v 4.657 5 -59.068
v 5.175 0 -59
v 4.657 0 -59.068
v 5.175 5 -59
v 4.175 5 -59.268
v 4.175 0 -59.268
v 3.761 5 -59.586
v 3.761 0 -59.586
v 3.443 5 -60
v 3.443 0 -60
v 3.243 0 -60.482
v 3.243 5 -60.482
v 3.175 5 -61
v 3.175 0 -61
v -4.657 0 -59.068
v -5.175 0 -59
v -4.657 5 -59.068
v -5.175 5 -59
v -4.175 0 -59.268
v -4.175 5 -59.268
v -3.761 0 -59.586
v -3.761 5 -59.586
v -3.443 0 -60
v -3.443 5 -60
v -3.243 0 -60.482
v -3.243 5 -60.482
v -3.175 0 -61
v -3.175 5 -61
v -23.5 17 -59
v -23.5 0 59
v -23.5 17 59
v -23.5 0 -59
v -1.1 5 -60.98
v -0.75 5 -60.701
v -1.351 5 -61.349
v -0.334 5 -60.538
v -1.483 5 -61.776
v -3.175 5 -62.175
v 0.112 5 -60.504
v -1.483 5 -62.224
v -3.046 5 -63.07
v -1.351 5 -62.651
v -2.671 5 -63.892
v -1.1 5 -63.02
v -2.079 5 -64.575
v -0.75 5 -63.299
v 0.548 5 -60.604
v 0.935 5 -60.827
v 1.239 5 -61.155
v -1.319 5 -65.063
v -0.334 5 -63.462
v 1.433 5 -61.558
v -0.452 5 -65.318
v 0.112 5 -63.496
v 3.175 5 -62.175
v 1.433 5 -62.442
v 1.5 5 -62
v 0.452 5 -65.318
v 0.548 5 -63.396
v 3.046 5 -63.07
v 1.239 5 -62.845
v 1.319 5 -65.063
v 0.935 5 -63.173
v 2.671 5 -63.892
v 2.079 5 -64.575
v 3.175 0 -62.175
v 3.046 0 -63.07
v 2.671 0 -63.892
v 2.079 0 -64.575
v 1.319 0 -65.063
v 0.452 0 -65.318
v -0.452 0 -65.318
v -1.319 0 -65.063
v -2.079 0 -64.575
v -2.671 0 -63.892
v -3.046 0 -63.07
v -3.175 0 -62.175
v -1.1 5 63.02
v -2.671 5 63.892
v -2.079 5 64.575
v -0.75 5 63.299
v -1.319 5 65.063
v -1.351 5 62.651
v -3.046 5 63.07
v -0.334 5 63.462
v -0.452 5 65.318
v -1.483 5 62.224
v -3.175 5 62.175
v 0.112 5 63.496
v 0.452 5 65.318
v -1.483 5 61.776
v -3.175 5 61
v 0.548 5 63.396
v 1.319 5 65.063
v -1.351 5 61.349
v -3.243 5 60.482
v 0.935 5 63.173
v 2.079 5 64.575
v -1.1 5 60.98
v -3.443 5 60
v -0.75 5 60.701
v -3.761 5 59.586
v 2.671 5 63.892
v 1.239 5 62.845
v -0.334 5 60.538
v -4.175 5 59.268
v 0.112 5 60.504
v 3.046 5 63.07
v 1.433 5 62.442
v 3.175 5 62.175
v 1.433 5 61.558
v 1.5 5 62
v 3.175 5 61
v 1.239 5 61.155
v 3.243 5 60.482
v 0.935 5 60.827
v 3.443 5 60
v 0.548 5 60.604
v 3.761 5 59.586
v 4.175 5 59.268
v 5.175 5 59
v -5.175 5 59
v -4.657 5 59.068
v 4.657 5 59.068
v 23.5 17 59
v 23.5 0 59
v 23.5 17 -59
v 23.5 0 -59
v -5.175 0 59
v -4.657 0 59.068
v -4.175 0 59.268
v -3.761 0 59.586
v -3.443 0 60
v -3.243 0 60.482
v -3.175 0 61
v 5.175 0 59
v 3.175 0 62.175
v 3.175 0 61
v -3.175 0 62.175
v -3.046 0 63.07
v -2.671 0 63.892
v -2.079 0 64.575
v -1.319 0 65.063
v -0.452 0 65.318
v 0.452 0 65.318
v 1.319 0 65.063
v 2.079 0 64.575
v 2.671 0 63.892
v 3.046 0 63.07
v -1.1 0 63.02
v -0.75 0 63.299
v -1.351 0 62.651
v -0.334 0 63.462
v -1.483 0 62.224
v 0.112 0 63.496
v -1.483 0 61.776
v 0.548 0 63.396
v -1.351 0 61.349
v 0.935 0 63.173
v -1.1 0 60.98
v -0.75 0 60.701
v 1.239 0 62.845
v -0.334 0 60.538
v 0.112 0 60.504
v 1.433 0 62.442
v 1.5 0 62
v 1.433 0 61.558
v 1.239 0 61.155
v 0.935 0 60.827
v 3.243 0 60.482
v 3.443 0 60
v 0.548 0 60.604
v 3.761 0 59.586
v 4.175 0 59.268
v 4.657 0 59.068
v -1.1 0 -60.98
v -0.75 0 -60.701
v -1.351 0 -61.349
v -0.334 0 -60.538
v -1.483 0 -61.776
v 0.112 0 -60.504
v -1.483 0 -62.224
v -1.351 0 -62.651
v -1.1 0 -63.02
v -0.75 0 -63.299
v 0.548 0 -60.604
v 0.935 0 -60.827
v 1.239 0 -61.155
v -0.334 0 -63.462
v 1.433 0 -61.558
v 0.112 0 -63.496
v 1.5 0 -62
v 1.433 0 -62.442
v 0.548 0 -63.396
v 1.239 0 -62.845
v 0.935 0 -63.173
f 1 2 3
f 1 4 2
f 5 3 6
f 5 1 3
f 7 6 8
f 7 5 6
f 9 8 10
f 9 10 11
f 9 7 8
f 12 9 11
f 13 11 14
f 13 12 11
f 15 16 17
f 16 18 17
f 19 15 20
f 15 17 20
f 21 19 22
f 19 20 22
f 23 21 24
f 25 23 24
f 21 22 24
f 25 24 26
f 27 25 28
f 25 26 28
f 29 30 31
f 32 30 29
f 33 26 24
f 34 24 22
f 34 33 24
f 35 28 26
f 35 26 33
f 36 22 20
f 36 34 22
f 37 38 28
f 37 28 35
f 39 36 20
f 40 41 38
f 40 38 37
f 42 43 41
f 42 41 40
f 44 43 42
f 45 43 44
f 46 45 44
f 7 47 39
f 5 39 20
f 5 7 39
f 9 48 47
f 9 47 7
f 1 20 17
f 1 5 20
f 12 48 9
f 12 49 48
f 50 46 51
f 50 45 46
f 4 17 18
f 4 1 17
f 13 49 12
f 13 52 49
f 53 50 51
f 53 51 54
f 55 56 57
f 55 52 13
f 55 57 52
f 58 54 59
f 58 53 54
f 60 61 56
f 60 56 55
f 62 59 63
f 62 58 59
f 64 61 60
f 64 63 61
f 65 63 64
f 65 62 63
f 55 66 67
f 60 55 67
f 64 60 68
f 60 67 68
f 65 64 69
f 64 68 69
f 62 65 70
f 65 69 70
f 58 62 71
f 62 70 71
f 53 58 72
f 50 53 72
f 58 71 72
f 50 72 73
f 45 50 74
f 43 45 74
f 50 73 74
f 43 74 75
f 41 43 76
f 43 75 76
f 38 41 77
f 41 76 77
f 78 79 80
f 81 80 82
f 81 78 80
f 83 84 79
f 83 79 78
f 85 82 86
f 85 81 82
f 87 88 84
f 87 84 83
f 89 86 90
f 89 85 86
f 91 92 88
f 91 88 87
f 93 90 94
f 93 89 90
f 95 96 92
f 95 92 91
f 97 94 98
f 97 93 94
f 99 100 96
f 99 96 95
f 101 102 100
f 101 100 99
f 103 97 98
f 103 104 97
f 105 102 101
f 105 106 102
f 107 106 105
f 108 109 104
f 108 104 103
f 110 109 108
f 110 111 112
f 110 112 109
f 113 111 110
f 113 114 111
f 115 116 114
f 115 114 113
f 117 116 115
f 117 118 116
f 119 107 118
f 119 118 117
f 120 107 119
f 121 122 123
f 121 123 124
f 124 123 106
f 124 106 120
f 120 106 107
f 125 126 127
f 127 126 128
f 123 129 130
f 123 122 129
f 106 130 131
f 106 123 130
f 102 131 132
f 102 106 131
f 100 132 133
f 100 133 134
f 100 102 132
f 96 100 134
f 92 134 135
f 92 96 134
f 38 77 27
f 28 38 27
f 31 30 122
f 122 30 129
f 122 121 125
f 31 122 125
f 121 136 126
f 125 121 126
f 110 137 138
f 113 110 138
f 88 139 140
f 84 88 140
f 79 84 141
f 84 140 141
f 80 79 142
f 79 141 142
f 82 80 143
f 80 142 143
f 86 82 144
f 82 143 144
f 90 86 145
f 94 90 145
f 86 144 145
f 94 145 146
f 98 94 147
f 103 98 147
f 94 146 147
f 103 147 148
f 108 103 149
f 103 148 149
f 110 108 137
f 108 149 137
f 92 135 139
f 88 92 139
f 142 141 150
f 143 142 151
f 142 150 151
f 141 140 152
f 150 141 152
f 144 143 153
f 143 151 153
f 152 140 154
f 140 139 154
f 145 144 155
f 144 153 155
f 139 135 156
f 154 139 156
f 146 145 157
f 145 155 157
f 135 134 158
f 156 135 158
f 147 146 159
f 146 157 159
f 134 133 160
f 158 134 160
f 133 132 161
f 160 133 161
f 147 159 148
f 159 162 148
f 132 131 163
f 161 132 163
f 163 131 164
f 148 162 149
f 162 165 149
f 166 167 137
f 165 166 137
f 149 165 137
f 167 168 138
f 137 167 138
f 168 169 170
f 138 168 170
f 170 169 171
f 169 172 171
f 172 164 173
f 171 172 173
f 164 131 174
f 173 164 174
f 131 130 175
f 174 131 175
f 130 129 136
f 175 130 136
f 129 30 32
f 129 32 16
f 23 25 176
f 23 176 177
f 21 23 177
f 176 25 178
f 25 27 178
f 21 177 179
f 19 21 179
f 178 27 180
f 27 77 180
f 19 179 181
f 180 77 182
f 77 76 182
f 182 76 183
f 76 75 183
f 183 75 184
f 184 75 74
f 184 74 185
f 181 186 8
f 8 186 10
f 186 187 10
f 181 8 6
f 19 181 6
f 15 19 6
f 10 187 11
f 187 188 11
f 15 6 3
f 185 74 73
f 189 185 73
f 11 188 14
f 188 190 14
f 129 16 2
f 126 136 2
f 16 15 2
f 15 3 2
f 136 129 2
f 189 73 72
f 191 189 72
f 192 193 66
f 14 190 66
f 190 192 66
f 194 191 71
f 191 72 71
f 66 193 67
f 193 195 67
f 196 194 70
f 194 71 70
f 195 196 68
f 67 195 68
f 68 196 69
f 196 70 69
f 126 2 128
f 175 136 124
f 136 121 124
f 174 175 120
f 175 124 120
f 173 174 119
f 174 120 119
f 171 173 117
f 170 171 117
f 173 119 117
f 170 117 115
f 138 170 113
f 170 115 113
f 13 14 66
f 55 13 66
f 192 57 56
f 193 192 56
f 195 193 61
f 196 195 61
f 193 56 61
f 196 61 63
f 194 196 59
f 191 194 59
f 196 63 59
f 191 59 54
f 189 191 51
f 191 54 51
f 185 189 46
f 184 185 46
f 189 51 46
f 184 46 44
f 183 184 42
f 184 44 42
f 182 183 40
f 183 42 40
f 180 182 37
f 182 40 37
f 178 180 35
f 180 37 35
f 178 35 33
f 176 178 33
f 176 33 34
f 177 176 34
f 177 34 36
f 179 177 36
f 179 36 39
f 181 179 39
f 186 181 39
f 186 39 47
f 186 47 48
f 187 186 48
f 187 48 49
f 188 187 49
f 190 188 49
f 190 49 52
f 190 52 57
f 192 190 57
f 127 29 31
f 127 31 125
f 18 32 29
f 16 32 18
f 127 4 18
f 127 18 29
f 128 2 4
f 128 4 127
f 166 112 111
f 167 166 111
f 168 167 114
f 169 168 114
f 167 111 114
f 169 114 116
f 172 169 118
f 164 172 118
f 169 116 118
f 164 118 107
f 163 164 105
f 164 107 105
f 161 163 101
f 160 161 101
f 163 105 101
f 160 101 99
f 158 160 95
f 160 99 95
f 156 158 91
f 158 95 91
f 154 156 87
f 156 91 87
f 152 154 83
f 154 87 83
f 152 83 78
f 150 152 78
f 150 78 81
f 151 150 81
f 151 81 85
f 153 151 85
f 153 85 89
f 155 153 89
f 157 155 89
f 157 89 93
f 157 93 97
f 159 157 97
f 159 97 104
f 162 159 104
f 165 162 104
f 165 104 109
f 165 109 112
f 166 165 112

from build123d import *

# Parameters (mm, degrees)
SKETCH1_W           = 47
SKETCH1_H           = 118
BOSS_EXTRUDE1_DEPTH = 17
BOSS_EXTRUDE2_DEPTH = 5
SKETCH3_R           = 1.5
CUT_EXTRUDE1_DEPTH  = 6
FILLET2_R           = 2


with BuildPart() as part:
    # Sketch1 → Boss-Extrude1 (new body)
    with BuildSketch(Plane(origin=(0, 0, 0), x_dir=(1, 0, 0), z_dir=(0, 1, 0))):
        Rectangle(SKETCH1_W, SKETCH1_H)
    extrude(amount=BOSS_EXTRUDE1_DEPTH)

    # Sketch2 → Boss-Extrude2 (add)
    with BuildSketch(Plane(origin=(0, 0, 0), x_dir=(1, 0, 0), z_dir=(0, 1, 0))):
        with BuildLine():
            Line((-3.175, 62.175), (-3.175, 59))
            Line((-3.175, 59), (3.175, 59))
            Line((3.175, 59), (3.175, 62.175))
            ThreePointArc((3.175, 62.175), (0, 65.35), (-3.175, 62.175))
        make_face()
        with BuildLine():
            Line((3.175, -62.175), (3.175, -59))
            Line((3.175, -59), (-3.175, -59))
            Line((-3.175, -59), (-3.175, -62.175))
            ThreePointArc((-3.175, -62.175), (0, -65.35), (3.175, -62.175))
        make_face()
    extrude(amount=BOSS_EXTRUDE2_DEPTH)

    # Sketch3 → Cut-Extrude1 (cut, through all)
    with BuildSketch(Plane(origin=(0, 5, 0), x_dir=(1, 0, 0), z_dir=(0, 1, 0))):
        with Locations((0, -62)):
            Circle(SKETCH3_R)
        with Locations((0, 62)):
            Circle(SKETCH3_R)
    extrude(amount=-CUT_EXTRUDE1_DEPTH, mode=Mode.SUBTRACT)

    # Fillet2
    fillet2_edges = [part.edges().sort_by_distance(p)[0] for p in [
        (-3.175, 2.5, -59),
        (3.175, 2.5, -59),
        (3.175, 2.5, 59),
        (-3.175, 2.5, 59),
    ]]
    fillet(fillet2_edges, radius=FILLET2_R)


solid = part.part
